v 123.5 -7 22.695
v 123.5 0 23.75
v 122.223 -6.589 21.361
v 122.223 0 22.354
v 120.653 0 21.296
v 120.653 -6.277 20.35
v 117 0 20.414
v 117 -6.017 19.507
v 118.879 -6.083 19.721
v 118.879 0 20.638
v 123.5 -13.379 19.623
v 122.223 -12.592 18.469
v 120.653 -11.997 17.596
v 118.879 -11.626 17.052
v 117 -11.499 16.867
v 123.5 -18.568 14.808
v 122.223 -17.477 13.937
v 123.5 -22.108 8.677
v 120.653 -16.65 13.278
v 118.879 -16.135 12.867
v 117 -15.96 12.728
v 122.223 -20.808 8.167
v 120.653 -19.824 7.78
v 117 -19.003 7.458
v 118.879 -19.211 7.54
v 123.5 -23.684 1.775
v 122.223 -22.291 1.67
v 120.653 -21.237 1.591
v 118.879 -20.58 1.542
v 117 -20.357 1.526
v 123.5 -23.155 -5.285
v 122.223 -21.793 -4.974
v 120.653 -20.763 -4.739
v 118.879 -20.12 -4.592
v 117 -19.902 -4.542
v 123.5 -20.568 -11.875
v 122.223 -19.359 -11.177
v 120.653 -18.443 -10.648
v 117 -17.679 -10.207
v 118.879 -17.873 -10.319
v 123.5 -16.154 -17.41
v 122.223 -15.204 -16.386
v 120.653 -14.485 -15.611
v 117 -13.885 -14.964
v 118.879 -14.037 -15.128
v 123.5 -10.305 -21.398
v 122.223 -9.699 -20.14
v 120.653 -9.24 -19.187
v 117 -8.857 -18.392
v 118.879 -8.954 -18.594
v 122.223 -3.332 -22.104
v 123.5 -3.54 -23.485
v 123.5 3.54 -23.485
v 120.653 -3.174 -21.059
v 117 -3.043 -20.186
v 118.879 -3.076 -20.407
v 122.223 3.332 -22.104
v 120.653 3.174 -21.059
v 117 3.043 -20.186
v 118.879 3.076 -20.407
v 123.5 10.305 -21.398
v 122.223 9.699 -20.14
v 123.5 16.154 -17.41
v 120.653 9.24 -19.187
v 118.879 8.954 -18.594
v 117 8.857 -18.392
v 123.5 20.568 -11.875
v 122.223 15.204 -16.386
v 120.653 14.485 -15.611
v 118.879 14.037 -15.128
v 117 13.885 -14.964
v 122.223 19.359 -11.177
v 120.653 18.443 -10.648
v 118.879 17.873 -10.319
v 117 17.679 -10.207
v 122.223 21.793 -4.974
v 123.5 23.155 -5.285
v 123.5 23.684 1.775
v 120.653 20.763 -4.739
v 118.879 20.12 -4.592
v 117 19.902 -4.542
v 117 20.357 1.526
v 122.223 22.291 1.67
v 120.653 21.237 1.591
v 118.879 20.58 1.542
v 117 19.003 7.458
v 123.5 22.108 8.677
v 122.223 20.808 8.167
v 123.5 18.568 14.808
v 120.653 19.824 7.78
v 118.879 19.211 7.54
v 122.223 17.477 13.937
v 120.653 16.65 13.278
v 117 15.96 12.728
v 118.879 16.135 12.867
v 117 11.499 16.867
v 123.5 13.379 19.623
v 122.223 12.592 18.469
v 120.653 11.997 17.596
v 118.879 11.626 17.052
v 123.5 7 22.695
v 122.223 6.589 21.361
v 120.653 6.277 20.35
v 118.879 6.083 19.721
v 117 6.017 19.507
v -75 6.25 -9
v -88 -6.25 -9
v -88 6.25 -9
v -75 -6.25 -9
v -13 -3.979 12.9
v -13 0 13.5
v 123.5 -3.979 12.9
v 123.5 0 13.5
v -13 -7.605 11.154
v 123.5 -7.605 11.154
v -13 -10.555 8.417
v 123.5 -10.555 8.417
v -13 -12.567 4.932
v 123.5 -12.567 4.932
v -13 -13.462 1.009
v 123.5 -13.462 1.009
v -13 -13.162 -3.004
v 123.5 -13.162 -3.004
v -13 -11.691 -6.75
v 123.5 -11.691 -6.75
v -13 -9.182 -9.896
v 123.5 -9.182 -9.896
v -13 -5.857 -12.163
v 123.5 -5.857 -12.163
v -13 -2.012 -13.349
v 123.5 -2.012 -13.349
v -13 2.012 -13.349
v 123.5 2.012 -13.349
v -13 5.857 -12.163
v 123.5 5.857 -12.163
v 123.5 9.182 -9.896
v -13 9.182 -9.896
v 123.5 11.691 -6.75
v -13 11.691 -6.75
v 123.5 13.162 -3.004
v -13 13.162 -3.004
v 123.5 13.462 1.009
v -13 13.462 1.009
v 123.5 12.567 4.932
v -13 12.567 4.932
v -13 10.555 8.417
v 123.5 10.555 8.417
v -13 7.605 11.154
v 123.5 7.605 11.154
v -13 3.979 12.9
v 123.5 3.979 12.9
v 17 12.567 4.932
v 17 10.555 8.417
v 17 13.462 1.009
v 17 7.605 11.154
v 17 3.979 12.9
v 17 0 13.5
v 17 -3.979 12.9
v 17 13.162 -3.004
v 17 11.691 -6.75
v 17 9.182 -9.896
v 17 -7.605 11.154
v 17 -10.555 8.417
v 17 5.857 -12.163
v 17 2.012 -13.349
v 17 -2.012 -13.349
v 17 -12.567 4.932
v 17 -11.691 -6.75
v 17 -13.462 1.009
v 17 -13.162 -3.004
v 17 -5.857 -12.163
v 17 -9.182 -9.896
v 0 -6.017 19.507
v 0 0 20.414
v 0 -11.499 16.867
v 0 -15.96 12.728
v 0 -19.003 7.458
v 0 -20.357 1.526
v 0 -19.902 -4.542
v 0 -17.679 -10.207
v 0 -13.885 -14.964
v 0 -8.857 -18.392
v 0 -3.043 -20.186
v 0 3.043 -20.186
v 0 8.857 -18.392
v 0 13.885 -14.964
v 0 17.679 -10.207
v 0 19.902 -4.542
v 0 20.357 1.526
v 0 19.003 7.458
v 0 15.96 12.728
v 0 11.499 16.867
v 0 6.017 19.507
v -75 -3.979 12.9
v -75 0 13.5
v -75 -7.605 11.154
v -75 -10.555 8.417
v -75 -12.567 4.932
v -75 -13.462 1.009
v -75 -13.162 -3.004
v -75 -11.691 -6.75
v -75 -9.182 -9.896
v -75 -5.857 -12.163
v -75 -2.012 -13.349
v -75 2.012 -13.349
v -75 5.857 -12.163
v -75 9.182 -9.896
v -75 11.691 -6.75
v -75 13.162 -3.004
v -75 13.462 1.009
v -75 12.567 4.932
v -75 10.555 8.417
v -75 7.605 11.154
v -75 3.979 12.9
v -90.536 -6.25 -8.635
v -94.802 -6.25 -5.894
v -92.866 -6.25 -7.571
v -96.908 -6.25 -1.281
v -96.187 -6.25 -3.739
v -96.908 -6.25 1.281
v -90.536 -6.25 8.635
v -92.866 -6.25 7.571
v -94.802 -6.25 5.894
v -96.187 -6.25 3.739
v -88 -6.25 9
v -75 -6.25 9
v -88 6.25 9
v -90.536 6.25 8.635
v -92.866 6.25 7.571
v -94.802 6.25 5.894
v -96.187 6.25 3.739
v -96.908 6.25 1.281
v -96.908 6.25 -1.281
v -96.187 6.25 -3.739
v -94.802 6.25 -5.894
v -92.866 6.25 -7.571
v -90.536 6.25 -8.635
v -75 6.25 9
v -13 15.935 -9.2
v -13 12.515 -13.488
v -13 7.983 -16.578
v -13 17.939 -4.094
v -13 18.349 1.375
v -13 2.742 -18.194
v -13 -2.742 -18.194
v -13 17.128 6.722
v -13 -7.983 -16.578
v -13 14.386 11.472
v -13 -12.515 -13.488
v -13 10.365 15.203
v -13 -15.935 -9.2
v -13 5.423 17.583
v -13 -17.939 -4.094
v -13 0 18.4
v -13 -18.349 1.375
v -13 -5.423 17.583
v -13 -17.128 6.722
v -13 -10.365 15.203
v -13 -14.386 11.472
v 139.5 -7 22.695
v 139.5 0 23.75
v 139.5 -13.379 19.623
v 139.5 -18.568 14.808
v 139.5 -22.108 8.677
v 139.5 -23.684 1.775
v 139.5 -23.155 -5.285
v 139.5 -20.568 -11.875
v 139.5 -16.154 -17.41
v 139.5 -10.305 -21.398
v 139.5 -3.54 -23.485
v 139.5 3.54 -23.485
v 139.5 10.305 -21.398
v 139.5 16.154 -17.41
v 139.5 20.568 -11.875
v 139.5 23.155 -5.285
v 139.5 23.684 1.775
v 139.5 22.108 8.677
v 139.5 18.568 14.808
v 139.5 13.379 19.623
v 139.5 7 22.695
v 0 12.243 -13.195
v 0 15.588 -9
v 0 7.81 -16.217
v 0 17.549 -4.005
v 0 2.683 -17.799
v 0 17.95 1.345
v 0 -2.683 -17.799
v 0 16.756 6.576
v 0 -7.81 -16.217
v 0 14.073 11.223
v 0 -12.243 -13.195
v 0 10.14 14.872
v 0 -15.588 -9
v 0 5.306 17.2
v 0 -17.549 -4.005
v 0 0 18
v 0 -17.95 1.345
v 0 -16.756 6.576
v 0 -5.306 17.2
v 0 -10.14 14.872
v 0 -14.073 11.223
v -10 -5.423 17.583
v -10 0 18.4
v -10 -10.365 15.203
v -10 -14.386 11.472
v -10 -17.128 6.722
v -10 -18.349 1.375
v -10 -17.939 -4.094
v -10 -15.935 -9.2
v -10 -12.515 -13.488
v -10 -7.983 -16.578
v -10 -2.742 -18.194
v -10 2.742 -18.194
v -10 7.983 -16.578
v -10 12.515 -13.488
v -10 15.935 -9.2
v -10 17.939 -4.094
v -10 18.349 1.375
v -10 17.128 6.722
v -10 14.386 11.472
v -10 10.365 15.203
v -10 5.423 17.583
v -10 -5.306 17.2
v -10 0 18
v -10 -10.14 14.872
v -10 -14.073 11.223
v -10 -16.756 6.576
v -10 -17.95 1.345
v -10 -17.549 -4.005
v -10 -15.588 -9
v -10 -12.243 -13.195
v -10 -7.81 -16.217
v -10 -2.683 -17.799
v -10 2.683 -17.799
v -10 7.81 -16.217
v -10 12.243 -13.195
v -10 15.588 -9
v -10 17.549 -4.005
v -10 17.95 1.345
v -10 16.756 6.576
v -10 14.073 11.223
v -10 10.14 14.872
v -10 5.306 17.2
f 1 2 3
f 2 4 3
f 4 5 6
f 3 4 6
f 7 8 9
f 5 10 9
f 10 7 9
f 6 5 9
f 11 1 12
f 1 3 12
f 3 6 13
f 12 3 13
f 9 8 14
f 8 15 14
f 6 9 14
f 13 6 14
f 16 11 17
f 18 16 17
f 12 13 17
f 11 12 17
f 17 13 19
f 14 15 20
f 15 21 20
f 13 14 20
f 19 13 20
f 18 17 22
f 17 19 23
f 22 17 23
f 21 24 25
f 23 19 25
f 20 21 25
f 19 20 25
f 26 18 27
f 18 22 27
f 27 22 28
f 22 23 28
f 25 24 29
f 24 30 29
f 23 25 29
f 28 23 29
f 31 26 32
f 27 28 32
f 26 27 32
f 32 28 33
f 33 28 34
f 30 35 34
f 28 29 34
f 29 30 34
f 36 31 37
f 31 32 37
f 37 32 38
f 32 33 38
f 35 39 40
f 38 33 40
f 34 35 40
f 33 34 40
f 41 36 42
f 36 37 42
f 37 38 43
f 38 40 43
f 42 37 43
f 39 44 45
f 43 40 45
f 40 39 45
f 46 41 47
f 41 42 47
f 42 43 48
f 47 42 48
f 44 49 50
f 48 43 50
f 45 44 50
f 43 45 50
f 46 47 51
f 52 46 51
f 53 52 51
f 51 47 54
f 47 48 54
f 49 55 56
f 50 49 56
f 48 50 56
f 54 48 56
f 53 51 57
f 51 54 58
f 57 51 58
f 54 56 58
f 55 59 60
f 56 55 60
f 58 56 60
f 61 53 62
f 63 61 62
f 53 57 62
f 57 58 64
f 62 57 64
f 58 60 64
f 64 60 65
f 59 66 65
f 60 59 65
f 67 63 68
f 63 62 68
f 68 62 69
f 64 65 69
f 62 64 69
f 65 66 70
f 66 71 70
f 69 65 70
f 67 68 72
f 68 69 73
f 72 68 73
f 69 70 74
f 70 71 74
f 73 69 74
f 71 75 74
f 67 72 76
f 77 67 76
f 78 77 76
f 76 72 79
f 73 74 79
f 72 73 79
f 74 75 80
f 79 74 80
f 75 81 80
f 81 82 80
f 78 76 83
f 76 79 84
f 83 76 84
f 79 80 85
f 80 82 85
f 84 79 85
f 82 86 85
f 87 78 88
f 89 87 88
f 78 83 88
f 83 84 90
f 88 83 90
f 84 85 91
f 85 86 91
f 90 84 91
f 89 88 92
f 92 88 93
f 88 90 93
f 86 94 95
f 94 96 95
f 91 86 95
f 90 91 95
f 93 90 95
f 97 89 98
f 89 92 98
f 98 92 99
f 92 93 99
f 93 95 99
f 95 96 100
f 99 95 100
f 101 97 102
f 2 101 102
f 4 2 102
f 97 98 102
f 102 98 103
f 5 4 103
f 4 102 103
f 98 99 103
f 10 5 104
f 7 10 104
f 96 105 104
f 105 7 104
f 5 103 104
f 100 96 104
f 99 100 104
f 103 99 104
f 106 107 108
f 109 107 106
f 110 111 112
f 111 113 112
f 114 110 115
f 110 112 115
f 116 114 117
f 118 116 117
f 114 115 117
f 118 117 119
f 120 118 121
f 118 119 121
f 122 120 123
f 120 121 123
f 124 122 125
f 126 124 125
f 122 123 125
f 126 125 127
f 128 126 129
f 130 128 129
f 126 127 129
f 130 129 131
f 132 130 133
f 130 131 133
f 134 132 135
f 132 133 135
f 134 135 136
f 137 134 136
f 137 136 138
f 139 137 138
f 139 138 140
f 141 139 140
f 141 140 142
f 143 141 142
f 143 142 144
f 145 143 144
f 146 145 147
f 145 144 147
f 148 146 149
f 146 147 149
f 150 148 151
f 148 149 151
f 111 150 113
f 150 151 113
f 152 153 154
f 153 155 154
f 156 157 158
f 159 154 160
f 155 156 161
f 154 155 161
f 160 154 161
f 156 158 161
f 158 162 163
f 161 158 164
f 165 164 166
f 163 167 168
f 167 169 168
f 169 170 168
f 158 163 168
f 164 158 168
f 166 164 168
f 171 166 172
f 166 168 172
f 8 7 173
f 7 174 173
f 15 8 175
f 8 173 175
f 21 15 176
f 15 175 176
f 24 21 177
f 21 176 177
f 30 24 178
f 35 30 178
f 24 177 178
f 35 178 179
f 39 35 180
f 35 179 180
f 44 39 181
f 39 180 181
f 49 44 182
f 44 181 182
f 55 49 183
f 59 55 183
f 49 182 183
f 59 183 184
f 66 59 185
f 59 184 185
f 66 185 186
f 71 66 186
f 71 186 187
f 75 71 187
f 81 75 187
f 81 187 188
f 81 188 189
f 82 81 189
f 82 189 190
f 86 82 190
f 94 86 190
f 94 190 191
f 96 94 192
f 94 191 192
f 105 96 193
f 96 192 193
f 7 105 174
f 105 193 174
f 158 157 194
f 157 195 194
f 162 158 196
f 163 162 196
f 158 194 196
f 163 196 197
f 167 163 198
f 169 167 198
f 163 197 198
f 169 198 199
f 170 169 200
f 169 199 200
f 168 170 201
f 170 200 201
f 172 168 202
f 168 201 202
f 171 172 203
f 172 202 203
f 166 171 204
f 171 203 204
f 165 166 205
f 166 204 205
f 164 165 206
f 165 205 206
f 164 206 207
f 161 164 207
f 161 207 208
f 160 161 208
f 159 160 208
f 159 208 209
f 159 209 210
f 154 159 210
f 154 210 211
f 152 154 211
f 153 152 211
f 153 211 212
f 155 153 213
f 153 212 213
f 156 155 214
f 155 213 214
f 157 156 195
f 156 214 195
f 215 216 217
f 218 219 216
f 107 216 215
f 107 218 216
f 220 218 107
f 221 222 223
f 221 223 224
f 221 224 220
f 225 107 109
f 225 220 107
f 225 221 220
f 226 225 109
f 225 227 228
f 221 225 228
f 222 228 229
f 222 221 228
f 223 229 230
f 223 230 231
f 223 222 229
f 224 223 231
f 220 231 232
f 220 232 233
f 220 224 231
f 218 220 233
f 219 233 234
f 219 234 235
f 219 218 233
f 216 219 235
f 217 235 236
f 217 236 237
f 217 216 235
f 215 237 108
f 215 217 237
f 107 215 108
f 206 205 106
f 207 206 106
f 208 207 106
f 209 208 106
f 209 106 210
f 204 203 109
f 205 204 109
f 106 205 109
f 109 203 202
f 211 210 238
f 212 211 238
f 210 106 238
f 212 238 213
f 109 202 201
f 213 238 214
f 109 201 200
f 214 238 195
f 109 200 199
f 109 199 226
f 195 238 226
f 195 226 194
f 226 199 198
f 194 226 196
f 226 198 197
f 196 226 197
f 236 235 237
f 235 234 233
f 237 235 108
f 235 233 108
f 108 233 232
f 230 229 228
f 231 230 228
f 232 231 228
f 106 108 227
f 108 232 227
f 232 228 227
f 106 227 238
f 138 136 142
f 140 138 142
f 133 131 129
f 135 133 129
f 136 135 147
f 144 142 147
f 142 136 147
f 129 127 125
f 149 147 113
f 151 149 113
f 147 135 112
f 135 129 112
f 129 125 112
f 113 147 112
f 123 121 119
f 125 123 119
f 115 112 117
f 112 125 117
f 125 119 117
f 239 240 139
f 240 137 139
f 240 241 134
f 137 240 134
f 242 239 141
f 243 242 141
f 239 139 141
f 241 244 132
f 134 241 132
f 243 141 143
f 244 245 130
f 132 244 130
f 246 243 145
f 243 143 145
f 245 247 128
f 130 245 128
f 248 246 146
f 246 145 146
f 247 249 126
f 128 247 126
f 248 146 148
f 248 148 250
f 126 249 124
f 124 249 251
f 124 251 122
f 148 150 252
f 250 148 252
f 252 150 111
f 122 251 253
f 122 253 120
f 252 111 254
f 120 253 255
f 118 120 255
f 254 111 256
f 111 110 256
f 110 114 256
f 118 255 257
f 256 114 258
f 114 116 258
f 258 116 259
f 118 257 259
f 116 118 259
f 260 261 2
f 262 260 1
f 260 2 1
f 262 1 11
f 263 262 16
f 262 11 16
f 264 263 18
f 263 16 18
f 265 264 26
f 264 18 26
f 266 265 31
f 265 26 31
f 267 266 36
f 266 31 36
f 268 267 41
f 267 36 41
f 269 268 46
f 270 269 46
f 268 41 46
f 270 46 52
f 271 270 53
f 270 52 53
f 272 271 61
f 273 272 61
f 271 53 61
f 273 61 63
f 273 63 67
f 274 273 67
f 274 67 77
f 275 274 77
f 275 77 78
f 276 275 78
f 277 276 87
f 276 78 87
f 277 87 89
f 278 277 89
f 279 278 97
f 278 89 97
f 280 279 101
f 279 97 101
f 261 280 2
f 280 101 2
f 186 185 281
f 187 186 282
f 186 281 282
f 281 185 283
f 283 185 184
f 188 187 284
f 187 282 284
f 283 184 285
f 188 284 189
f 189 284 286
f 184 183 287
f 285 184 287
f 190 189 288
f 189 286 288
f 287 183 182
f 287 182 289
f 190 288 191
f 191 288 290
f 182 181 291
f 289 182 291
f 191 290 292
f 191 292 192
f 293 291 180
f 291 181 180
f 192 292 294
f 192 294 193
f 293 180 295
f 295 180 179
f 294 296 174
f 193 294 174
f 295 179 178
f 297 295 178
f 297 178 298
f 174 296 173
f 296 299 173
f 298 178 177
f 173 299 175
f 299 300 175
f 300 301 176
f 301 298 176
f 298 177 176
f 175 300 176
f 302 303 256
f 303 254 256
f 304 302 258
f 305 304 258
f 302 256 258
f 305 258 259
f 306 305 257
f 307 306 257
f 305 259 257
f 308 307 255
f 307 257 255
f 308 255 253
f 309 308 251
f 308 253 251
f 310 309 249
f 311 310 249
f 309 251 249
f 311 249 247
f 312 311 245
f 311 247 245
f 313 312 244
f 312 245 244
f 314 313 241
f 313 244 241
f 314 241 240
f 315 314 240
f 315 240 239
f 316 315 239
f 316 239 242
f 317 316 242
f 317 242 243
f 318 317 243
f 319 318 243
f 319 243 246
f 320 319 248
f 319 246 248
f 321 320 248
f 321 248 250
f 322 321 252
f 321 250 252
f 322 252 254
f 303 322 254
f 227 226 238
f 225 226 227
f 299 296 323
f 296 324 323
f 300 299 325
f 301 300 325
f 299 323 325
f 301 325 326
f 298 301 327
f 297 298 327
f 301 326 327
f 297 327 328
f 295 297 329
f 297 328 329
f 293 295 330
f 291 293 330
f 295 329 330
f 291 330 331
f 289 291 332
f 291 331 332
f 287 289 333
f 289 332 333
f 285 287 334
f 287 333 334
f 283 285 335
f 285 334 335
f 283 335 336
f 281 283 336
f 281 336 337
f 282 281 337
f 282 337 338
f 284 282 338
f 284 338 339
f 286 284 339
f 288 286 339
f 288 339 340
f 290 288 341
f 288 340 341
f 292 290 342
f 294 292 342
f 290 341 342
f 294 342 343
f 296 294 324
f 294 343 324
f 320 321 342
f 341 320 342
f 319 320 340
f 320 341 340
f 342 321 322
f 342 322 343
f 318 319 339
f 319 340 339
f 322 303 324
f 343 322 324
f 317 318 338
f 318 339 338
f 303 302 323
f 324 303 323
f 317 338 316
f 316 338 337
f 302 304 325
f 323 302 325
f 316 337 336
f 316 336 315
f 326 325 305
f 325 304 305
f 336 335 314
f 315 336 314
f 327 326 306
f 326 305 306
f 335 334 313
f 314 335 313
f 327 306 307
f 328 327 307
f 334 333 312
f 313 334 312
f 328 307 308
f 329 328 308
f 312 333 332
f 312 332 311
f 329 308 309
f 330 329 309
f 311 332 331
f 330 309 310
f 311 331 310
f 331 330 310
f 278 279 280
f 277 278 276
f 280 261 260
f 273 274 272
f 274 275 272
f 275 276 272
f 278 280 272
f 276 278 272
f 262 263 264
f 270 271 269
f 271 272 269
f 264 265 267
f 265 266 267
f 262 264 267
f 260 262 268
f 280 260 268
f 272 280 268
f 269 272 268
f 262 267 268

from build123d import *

# Parameters (mm, degrees)
F0_W     = 30
F0_H     = 13.5
F3_DEPTH = 6.25


with BuildPart() as f1:
    # F0 (on Front) → F1 (revolve)
    with BuildSketch(Plane.XZ):
        with BuildLine():
            Line((-13, 18.4), (-13, 13.5))
            Line((-13, 13.5), (17, 13.5))
            Line((17, 13.5), (123.5, 13.5))
            Line((123.5, 13.5), (123.5, 0))
            Line((123.5, 0), (139.5, 0))
            Line((139.5, 0), (139.5, 9))
            Line((139.5, 9), (139.5, 23.75))
            Line((139.5, 23.75), (123.5, 23.75))
            ThreePointArc((123.5, 23.75), (120.6531139996, 21.2964739118), (117, 20.4136895265))
            Line((117, 20.4136895265), (0, 20.4136895265))
            Line((0, 20.4136895265), (0, 18))
            Line((0, 18), (-10, 18))
            Line((-10, 18), (-10, 18.4))
            Line((-10, 18.4), (-13, 18.4))
        make_face()
    revolve(axis=Axis((37, 0, 0), (1, 0, 0)))


with BuildPart() as f2:
    # F0 (on Front) → F2 (revolve)
    with BuildSketch(Plane.XZ):
        Polygon((-75, 0), (-13, 0), (-13, 13.5), (-75, 13.5), (-75, 9), align=None)
        with Locations((2, 6.75)):
            Rectangle(F0_W, F0_H)
    revolve(axis=Axis((37, 0, 0), (1, 0, 0)))

    # F0 (on Front) → F3 (join, symmetric)
    with BuildSketch(Plane.XZ):
        with BuildLine():
            Line((-79, 0), (-75, 0))
            Line((-75, 0), (-75, 9))
            Line((-75, 9), (-88, 9))
            ThreePointArc((-88, 9), (-81.6360389693, 6.3639610307), (-79, 0))
        make_face()
        with BuildLine():
            Line((-75, -9), (-75, 0))
            Line((-75, 0), (-79, 0))
            ThreePointArc((-79, 0), (-81.6360389693, -6.3639610307), (-88, -9))
            Line((-88, -9), (-75, -9))
        make_face()
        with BuildLine():
            ThreePointArc((-88, -9), (-81.6360389693, -6.3639610307), (-79, 0))
            ThreePointArc((-79, 0), (-81.6360389693, 6.3639610307), (-88, 9))
            ThreePointArc((-88, 9), (-97, 0), (-88, -9))
        make_face()
    extrude(amount=F3_DEPTH, both=True)


solid = Compound([f1.part, f2.part])
